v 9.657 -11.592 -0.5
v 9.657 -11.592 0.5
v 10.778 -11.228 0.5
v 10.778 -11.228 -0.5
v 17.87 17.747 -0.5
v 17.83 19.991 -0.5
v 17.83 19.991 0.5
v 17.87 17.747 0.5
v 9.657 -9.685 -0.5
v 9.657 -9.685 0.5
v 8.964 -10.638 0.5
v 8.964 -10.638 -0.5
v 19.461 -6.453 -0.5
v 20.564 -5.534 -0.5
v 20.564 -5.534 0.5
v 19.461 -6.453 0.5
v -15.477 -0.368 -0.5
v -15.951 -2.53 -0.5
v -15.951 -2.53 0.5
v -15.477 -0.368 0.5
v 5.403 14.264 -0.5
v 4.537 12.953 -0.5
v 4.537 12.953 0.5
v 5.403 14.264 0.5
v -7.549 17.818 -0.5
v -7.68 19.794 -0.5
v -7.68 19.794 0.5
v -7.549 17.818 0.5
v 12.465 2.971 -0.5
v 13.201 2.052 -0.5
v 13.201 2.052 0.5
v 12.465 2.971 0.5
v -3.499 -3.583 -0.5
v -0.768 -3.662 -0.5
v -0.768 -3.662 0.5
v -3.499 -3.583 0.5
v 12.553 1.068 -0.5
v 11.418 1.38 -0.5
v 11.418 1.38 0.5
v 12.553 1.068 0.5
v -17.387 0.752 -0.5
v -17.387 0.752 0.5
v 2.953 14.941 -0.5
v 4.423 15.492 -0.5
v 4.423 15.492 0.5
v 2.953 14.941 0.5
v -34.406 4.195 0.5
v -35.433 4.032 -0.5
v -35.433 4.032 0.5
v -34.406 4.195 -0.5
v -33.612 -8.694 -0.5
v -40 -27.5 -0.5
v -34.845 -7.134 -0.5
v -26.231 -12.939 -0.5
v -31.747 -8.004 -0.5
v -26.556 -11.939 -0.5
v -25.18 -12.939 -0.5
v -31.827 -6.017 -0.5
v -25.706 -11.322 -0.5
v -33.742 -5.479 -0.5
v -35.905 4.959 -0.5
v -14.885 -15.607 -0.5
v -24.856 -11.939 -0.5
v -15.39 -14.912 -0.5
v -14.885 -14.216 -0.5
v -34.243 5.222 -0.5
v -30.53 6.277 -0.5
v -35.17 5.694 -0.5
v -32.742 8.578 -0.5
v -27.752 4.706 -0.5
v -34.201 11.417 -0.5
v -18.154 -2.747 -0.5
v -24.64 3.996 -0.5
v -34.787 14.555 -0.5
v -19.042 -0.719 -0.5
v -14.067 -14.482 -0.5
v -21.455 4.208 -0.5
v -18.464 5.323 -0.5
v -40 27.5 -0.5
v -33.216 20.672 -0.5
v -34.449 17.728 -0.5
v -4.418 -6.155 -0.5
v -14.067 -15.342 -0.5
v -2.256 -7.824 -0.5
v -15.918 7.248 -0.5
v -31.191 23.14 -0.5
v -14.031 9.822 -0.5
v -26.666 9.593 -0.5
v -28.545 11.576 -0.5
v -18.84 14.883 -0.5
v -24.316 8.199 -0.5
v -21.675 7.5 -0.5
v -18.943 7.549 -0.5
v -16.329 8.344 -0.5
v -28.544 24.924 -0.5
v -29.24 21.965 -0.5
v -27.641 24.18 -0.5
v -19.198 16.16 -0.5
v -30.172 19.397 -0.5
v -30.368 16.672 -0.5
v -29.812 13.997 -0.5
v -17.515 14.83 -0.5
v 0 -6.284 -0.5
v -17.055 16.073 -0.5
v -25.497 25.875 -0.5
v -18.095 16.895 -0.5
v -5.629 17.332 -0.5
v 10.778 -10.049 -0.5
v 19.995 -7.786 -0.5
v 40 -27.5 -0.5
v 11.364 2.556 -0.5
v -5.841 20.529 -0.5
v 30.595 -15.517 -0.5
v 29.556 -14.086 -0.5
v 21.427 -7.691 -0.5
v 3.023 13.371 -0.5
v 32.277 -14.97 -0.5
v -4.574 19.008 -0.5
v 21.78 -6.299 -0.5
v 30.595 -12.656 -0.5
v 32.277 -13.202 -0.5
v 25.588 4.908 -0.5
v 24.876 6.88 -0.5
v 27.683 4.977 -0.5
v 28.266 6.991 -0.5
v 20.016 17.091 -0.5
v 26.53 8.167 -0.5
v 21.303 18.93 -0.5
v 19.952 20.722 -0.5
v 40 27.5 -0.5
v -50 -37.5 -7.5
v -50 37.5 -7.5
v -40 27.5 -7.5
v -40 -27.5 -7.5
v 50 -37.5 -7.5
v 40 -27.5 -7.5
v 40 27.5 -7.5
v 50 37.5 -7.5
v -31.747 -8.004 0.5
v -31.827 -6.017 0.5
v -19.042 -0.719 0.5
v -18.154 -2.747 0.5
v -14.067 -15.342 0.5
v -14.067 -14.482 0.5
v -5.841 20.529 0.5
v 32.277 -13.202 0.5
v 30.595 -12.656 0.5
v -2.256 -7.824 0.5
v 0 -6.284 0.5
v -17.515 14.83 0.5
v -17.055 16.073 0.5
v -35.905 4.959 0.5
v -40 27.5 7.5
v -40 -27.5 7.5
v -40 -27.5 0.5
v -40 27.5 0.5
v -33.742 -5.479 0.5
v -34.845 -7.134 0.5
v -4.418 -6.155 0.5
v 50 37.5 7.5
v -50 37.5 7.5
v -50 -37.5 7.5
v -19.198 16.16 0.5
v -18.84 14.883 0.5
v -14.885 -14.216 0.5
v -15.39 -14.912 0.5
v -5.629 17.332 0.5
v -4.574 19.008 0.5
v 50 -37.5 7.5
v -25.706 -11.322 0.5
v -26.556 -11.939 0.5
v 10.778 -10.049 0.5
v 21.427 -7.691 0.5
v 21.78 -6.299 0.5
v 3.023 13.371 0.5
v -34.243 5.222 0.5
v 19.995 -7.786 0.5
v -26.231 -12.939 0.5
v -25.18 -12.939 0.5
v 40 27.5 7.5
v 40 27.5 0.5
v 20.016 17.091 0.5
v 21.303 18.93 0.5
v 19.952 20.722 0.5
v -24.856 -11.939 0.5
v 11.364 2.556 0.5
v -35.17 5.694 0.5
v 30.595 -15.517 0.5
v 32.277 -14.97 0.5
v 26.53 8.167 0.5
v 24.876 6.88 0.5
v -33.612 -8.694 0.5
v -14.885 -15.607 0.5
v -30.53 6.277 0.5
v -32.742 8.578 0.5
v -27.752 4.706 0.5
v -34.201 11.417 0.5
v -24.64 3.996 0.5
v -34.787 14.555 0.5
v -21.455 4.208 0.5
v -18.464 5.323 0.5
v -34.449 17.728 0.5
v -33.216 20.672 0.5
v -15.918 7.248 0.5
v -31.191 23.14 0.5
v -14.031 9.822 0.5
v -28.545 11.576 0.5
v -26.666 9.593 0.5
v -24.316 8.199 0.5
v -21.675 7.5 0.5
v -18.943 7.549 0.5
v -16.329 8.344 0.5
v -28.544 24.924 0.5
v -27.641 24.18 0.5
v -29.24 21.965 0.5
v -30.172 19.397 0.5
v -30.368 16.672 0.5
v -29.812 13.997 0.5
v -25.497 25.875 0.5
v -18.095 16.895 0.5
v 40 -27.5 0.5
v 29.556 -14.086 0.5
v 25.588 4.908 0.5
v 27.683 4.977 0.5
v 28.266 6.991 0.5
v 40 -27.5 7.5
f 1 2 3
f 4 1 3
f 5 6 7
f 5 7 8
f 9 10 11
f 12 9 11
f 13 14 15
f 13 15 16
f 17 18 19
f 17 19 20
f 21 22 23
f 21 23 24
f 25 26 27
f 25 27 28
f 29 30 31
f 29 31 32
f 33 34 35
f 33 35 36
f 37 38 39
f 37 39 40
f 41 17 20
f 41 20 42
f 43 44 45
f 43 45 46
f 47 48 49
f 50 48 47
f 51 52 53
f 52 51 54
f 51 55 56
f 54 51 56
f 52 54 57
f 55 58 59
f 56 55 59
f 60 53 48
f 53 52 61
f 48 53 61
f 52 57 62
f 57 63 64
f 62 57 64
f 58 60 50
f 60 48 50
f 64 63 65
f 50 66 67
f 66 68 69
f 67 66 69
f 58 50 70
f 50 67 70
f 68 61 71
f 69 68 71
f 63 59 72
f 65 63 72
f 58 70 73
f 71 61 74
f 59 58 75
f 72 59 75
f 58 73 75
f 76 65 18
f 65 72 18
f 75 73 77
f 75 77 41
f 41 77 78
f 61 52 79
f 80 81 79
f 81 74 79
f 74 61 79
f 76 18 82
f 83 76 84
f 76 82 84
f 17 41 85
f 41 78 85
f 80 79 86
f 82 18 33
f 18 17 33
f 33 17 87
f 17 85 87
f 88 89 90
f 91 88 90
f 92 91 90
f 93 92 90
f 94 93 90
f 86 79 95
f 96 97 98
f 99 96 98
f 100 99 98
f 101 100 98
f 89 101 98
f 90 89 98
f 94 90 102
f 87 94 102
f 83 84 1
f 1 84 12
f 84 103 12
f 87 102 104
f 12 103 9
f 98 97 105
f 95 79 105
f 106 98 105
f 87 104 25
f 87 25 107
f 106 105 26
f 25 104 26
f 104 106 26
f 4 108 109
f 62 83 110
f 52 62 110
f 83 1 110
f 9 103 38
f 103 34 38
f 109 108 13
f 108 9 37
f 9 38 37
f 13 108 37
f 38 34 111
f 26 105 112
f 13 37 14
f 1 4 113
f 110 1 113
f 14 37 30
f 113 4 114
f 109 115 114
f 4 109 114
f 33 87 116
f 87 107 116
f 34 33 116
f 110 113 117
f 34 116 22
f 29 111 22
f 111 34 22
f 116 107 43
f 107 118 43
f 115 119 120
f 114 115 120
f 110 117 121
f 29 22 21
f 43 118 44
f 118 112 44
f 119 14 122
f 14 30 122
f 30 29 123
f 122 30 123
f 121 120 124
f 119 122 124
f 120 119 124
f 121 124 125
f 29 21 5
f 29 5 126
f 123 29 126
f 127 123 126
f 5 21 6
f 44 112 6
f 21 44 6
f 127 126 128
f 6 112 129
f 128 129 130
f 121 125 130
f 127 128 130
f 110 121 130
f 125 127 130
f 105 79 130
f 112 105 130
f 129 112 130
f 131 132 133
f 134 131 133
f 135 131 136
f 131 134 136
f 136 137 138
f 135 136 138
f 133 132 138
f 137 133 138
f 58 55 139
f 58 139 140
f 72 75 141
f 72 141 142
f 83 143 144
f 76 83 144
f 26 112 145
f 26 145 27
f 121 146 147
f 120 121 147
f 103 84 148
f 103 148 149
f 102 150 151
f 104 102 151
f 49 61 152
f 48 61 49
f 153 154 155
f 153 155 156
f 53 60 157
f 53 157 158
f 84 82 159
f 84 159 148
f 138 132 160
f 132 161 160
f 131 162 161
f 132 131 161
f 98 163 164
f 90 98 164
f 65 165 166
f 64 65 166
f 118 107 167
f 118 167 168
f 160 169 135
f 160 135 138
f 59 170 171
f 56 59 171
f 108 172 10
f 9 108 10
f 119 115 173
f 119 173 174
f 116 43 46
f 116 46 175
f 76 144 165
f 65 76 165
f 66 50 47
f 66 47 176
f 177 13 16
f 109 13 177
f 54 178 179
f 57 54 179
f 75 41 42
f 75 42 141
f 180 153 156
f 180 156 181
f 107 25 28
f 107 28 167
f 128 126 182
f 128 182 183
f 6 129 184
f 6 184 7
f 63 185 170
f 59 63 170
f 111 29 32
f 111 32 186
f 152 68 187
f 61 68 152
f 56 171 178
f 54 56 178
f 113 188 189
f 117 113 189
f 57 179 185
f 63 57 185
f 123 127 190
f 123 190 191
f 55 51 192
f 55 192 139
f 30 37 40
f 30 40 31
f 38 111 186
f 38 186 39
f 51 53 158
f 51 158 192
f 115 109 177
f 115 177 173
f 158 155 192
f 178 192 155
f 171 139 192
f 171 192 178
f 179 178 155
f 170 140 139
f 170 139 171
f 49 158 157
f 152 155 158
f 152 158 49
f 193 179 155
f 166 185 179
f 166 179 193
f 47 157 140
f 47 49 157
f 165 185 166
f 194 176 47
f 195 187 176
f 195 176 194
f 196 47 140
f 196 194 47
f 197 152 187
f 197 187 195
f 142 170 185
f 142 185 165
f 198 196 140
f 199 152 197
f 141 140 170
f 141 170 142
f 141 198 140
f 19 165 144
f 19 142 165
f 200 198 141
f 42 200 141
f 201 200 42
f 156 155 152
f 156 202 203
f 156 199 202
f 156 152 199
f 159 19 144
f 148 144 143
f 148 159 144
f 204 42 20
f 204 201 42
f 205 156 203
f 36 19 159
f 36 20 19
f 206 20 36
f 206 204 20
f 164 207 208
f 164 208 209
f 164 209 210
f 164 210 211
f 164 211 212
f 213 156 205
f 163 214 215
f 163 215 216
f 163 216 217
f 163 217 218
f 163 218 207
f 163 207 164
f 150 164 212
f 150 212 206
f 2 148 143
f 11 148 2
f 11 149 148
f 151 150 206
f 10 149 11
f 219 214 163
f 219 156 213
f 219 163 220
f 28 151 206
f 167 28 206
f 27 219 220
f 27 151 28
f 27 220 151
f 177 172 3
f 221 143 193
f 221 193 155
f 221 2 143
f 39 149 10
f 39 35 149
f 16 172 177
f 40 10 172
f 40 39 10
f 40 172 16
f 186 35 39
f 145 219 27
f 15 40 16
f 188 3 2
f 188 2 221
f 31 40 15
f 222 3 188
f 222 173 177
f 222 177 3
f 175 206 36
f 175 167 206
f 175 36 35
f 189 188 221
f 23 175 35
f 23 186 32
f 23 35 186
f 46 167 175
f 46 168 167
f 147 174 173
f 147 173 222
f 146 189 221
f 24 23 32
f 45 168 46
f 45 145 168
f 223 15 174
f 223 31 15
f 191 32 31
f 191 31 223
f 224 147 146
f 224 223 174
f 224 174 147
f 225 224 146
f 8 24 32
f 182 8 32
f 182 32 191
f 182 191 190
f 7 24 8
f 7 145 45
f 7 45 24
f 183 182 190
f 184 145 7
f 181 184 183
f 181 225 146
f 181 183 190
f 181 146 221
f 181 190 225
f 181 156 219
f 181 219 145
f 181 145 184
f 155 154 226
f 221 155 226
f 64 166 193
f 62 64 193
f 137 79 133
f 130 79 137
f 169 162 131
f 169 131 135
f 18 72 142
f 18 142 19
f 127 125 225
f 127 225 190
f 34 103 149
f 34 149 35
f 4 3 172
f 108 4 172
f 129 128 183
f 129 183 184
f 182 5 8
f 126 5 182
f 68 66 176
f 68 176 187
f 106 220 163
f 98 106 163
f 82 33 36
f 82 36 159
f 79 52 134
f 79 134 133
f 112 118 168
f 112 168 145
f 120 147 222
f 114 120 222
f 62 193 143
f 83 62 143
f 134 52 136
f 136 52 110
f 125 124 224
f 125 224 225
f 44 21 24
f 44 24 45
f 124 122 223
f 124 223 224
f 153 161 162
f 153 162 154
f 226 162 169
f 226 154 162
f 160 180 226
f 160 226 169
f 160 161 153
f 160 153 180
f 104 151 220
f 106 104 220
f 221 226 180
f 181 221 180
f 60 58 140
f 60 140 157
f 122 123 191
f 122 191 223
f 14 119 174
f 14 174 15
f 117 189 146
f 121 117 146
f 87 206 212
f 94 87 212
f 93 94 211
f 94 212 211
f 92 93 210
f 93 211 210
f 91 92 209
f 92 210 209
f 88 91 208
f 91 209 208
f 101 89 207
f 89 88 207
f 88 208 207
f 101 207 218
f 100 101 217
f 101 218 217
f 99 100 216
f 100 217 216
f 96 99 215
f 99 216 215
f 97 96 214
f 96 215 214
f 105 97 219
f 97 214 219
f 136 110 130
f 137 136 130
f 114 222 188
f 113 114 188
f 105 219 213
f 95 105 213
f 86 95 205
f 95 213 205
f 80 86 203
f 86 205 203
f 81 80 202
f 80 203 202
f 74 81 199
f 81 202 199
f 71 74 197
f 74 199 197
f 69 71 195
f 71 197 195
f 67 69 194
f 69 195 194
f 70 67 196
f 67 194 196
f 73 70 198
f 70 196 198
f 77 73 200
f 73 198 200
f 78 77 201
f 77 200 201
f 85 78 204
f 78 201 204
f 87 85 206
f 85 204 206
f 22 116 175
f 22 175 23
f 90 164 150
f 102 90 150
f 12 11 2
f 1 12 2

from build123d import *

# Parameters (mm, degrees)
F0_W     = 100
F0_H     = 75
F0_W_2   = 80
F0_H_2   = 55
F1_DEPTH = 7.5
F2_W     = 85
F2_H     = 60
F3_DEPTH = 0.5
F5_DEPTH = 4
F7_DEPTH = 4
F9_DEPTH = 2


with BuildPart() as f1:
    # F0 (on Top) → F1 (new body, symmetric)
    with BuildSketch(Plane.XY):
        Rectangle(F0_W, F0_H)
        Rectangle(F0_W_2, F0_H_2, mode=Mode.SUBTRACT)
    extrude(amount=F1_DEPTH, both=True)

    # F2 (on Top) → F3 (join, symmetric)
    with BuildSketch(Plane.XY):
        Rectangle(F2_W, F2_H)
    extrude(amount=F3_DEPTH, both=True)

    # F4 (on face) → F5 (cut, symmetric)
    with BuildSketch(Plane.XY.offset(0.5)):
        with BuildLine():
            ThreePointArc((-14.030779073, 9.8216604466), (-28.5453805779, 11.5757365705), (-25.4971957792, 25.8746529394))
            ThreePointArc((-25.4971957792, 25.8746529394), (-32.7417275782, 8.5783475559), (-14.030779073, 9.8216604466))
        make_face()
    extrude(amount=F5_DEPTH, both=True, mode=Mode.SUBTRACT)

    # F6 (on face) → F7 (cut, symmetric)
    with BuildSketch(Plane.XY.offset(0.5)):
        Polygon((-33.6119382633, -8.6941833252), (-31.7468941212, -8.0039128661), (-31.8270500041, -6.016845179), (-33.7416332062, -5.4790402695), (-34.8447548165, -7.1337262432), align=None)
        Polygon((-18.1541709736, -2.747406776), (-15.9509722143, -2.5300781708), (-15.4768381419, -0.3675534018), (-17.3870059292, 0.7516318018), (-19.0416886183, -0.7191984717), align=None)
        Polygon((-35.4328444953, 4.0322221243), (-34.4056151807, 4.1949180886), (-34.2429169225, 5.2221470399), (-35.1695931836, 5.6943134817), (-35.9050088677, 4.9588994397), align=None)
        Polygon((-2.2557034881, -7.8243230846), (0, -6.2835649587), (-0.7682973436, -3.6621430124), (-3.4988347035, -3.5827732766), (-4.4181022559, -6.1551420285), align=None)
        Polygon((25.5881788104, 4.9083078249), (27.6833120733, 4.9768951721), (28.2655134136, 6.9906799703), (26.5302003672, 8.1666800743), (24.8755165832, 6.8797033113), align=None)
        Polygon((19.9947226477, -7.7864271936), (21.4274991304, -7.6911230572), (21.7796117926, -6.2990210491), (20.5644529031, -5.5339588288), (19.4613307453, -6.4532263812), align=None)
        Polygon((11.3635717008, 2.5557714691), (11.4182028919, 1.3798037544), (12.5534966165, 1.068367096), (13.2005155343, 2.0518563705), (12.4651014924, 2.9711228281), align=None)
        Polygon((3.0226850162, 13.37136293), (4.5368093997, 12.9530541599), (5.4025348475, 14.2638075025), (4.4234582156, 15.4922063892), (2.9526301317, 14.9406453103), align=None)
        Polygon((19.9522579427, 20.7217878026), (17.8304072469, 19.9908427894), (17.8698893403, 17.7469684276), (20.0161413117, 17.0911228187), (21.3031158851, 18.9296623029), align=None)
        Polygon((-7.5485593761, 17.8178252237), (-5.6288838387, 17.3321217299), (-4.5737400011, 19.0077510251), (-5.8413007839, 20.529050376), (-7.6798402681, 19.7936357866), align=None)
        Polygon((-18.8396373222, 14.8832345039), (-17.5149254501, 14.8297967389), (-17.0547446343, 16.0731594196), (-18.0950491213, 16.8950375816), (-19.1981734687, 16.1596235397), align=None)
    extrude(amount=F7_DEPTH, both=True, mode=Mode.SUBTRACT)

    # F8 (on face) → F9 (cut)
    with BuildSketch(Plane.XY.offset(0.5)):
        Polygon((-26.2314461983, -12.9390526563), (-25.1804060423, -12.9390526563), (-24.8556167723, -11.9394540671), (-25.7059261203, -11.3216681638), (-26.5562354682, -11.9394540671), align=None)
        Polygon((-14.0670929104, -15.3417089426), (-14.0670929104, -14.4817656435), (-14.8849475887, -14.2160285498), (-15.3904095777, -14.911737293), (-14.8849475887, -15.6074460362), align=None)
        Polygon((32.2768948972, -14.9704083861), (32.2768948972, -13.2021199851), (30.5951526907, -12.6556888182), (29.5557788468, -14.0862641856), (30.5951526907, -15.516839553), align=None)
        Polygon((10.7780173421, -11.227759206), (10.7780173421, -10.0489047829), (9.6568601613, -9.6846187323), (8.9639469168, -10.6383319944), (9.6568601613, -11.5920452566), align=None)
    extrude(amount=-F9_DEPTH, mode=Mode.SUBTRACT)


solid = f1.part
